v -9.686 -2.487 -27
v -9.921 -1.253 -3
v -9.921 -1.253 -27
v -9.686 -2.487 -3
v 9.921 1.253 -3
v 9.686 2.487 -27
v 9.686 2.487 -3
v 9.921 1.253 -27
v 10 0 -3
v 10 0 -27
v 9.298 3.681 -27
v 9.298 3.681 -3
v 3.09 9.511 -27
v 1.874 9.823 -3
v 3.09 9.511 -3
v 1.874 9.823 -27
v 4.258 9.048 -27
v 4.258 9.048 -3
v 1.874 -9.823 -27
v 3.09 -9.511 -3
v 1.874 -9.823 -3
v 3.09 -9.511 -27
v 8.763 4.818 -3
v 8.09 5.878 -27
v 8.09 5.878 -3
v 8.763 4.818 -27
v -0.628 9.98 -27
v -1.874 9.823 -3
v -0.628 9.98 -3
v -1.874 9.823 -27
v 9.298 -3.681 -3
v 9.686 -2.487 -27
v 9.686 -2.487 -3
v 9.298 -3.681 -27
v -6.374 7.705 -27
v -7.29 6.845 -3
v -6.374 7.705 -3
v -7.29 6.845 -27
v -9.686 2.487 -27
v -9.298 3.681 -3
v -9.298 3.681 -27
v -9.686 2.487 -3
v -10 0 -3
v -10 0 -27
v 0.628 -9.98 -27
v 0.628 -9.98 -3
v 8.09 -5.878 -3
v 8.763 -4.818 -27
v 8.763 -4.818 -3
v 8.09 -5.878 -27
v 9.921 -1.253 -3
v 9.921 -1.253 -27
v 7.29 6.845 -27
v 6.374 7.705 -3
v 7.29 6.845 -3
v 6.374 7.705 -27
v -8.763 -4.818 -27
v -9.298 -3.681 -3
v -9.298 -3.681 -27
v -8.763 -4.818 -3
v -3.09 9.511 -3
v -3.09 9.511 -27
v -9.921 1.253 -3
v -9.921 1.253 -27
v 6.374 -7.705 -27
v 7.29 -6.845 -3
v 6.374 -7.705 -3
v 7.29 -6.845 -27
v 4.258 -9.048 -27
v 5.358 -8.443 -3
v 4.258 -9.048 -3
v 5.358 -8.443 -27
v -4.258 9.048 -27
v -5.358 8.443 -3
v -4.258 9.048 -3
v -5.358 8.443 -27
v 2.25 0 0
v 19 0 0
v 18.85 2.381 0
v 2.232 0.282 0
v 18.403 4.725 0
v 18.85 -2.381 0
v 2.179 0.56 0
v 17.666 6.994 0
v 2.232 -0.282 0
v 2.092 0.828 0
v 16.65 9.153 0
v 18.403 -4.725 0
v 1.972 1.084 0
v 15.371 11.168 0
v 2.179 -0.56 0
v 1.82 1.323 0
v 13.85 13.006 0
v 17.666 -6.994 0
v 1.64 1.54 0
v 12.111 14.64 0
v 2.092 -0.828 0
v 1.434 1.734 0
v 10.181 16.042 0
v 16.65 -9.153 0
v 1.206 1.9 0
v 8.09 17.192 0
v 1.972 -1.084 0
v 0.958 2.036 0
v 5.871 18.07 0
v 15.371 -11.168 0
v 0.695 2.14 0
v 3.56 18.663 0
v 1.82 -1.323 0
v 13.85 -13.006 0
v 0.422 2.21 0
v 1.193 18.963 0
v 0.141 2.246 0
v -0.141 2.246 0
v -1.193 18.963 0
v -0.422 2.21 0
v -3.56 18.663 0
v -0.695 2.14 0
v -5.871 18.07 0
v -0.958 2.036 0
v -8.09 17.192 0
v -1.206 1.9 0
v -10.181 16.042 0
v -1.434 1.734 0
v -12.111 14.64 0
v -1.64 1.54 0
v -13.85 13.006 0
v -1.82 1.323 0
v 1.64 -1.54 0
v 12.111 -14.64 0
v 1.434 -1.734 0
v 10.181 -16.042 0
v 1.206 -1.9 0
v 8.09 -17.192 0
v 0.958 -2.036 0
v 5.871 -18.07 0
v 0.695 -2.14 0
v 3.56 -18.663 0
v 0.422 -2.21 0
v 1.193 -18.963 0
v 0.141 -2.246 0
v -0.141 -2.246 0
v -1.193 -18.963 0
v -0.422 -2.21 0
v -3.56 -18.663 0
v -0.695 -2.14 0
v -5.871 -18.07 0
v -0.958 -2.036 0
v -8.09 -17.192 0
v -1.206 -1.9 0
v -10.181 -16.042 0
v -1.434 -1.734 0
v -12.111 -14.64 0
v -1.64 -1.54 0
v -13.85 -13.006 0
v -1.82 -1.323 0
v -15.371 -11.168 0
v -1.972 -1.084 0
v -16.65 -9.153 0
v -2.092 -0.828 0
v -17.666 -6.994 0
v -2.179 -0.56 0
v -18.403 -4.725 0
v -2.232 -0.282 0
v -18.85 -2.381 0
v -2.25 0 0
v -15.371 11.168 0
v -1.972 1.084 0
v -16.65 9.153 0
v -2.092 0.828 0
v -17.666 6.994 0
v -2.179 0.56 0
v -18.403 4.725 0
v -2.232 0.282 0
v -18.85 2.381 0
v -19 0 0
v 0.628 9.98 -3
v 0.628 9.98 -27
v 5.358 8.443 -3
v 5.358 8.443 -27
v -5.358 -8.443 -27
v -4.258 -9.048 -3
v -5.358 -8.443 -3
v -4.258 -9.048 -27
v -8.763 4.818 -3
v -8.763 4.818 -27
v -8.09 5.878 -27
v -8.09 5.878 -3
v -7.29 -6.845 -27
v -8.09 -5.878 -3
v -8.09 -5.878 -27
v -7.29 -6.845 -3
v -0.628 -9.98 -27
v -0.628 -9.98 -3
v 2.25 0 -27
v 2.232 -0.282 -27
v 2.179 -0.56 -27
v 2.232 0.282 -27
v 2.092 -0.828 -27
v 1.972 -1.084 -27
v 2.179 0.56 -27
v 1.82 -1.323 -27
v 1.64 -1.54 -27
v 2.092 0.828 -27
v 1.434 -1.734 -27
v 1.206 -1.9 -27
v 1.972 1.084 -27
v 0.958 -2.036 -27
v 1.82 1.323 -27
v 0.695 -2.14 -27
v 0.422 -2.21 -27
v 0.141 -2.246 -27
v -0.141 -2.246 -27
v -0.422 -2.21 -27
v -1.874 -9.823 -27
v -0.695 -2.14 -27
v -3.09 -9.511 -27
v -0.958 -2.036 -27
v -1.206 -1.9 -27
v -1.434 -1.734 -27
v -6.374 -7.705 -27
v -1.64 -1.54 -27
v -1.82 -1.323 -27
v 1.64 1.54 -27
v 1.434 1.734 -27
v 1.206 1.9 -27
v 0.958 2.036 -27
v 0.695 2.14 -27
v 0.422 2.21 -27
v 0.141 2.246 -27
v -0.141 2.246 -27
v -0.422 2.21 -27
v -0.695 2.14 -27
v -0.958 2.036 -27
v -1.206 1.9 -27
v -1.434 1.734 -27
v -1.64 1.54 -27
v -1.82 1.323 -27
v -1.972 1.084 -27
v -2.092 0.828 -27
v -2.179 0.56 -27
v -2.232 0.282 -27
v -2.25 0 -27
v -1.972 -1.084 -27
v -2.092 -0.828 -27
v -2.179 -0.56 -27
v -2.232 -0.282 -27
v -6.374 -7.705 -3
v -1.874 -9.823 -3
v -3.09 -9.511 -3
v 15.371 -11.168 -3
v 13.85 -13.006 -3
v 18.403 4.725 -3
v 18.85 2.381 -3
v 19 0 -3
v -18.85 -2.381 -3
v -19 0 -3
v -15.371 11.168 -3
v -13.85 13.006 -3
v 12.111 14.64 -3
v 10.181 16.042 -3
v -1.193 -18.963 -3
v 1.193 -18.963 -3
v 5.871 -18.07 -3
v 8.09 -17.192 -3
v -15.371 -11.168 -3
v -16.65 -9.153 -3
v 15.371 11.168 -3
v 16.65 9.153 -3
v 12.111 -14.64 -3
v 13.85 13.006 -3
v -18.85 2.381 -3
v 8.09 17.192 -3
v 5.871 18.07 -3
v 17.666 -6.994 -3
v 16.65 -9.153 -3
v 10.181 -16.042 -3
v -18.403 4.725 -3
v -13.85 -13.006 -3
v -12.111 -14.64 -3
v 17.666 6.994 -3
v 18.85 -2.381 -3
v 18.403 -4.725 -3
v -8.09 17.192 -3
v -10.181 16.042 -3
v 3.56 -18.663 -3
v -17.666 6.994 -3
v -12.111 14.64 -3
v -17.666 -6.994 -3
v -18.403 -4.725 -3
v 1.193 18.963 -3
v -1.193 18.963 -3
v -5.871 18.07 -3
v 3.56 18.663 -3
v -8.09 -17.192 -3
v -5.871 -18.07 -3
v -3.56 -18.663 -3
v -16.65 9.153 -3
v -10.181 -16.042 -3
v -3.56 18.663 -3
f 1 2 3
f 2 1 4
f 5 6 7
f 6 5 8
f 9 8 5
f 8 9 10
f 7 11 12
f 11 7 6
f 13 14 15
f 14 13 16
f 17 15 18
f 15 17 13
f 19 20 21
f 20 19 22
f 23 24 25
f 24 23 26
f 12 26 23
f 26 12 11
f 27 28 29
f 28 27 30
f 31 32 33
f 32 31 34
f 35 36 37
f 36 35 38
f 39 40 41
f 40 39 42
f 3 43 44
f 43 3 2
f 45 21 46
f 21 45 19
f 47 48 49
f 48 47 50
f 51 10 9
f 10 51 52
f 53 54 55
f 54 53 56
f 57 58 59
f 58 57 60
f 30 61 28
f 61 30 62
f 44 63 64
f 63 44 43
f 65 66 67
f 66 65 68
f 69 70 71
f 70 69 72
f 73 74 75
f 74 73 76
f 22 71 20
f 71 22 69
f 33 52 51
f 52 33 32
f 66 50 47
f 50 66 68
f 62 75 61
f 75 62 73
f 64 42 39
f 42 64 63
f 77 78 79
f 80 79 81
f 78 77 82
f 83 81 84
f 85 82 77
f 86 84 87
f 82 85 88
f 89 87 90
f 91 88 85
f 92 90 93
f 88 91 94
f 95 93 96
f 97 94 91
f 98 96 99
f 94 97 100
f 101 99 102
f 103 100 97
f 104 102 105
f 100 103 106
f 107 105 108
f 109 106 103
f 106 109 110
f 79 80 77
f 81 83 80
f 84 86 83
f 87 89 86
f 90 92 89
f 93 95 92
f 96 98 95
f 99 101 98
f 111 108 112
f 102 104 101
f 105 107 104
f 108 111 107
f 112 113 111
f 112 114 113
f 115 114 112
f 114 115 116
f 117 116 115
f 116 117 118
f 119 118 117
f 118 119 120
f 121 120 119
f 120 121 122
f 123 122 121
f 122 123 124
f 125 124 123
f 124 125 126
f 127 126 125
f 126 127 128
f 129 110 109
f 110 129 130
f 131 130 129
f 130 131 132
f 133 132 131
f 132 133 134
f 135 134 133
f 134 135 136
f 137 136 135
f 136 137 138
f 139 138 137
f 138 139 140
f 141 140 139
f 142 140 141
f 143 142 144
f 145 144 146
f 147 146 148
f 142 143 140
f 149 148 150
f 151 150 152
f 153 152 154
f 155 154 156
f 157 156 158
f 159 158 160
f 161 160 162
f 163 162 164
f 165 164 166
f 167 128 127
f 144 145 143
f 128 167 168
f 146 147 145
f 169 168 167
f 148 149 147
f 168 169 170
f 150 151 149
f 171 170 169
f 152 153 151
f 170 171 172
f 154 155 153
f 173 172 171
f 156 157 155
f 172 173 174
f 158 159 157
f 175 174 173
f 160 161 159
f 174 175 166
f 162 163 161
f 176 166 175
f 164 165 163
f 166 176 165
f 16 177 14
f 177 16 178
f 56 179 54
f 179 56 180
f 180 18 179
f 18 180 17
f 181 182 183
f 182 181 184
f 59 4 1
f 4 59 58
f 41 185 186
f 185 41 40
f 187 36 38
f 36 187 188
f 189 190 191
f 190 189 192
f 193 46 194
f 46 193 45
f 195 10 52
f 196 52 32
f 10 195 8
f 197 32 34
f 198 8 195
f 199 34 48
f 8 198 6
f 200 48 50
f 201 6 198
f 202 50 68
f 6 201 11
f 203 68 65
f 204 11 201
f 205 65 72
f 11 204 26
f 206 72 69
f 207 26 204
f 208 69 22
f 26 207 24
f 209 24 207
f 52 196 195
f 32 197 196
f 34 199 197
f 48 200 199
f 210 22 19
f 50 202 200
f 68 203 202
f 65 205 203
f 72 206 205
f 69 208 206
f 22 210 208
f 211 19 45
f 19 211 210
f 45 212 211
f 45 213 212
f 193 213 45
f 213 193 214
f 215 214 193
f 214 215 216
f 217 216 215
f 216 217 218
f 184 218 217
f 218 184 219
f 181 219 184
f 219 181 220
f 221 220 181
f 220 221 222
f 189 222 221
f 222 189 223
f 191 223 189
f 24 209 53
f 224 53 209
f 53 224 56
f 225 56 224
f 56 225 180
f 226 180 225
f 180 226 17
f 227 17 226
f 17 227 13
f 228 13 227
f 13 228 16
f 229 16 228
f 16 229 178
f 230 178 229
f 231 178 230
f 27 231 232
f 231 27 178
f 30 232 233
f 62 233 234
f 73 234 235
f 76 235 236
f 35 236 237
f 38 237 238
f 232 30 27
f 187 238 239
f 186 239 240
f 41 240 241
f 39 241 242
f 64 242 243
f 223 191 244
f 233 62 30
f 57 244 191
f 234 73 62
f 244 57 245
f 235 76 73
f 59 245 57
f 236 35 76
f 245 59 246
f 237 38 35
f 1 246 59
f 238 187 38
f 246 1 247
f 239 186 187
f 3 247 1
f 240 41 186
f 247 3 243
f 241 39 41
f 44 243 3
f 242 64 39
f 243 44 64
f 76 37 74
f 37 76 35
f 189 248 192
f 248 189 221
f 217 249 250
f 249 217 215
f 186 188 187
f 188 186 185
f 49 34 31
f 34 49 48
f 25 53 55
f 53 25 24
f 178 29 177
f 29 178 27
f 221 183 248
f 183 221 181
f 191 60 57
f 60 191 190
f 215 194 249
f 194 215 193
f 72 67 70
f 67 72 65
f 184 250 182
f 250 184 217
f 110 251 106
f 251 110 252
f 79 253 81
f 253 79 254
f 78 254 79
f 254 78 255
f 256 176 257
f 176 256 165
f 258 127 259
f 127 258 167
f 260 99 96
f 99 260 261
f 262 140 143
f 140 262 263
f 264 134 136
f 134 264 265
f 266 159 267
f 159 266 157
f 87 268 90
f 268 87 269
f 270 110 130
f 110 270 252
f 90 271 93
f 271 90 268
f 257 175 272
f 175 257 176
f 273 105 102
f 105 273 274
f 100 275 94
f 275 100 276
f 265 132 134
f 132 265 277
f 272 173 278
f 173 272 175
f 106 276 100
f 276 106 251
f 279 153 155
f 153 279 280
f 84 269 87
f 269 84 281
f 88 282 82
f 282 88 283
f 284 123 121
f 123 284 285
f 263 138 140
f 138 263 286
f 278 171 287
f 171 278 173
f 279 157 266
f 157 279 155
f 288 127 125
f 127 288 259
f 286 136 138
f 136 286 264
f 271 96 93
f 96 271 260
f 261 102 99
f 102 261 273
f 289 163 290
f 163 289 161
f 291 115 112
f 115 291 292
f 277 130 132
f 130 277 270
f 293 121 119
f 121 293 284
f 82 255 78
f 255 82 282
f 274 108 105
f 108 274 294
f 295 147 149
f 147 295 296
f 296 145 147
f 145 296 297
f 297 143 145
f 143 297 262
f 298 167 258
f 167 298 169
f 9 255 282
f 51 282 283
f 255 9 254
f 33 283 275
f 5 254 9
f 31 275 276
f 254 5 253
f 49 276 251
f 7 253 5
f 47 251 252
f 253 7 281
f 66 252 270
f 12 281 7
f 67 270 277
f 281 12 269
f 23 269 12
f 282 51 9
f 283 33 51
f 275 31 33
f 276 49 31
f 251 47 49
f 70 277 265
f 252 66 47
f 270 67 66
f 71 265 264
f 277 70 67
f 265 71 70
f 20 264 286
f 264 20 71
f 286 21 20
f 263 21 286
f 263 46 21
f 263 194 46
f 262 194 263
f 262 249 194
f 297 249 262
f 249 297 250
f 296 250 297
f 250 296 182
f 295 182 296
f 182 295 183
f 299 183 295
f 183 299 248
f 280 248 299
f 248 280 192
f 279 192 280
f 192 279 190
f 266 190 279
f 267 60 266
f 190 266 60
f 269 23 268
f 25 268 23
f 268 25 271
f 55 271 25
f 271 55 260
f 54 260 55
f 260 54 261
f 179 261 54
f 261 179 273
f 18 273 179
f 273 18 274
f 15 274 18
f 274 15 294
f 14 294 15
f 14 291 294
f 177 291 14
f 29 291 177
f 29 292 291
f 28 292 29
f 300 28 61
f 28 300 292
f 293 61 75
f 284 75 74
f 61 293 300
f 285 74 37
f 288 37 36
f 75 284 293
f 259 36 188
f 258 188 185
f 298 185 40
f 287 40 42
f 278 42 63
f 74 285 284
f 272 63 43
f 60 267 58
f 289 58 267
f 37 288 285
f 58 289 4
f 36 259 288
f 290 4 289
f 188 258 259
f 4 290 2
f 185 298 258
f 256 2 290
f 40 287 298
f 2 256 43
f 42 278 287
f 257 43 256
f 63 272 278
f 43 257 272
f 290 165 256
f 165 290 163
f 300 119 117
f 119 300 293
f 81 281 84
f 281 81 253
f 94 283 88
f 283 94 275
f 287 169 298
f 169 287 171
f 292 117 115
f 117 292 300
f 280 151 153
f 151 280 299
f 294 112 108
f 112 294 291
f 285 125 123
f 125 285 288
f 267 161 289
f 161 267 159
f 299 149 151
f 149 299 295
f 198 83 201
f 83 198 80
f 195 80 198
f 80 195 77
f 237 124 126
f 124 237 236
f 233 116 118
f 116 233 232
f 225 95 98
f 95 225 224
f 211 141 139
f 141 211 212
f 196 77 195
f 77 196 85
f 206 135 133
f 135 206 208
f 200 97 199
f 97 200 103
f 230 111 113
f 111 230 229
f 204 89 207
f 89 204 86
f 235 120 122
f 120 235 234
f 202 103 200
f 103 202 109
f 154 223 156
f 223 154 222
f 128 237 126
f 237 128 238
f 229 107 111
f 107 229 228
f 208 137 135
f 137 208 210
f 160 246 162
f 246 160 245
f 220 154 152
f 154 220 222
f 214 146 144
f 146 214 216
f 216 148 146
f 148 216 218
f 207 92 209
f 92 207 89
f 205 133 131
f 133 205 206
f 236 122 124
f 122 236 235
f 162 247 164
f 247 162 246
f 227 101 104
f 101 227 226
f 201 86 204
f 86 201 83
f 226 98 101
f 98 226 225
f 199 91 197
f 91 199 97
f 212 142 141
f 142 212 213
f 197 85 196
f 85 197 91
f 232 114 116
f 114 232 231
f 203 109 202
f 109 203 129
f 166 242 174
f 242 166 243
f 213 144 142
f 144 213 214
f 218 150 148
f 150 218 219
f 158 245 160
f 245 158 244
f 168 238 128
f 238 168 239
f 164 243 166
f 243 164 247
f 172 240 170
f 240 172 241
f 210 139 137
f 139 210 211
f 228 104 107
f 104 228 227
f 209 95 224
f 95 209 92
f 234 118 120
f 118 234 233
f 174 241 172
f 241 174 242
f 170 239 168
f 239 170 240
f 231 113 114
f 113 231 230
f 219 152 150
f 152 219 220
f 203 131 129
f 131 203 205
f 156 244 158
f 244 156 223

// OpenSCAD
$fn = 50;


difference() {
	union() {
		translate(v = [0, 0, -27.0000000000]) {
			cylinder(h = 27, r = 10.0000000000);
		}
		translate(v = [0, 0, -3.0000000000]) {
			cylinder(h = 3, r = 19.0000000000);
		}
	}
	union() {
		#translate(v = [0, 0, -27]) {
			cylinder(h = 27, r = 2.2500000000);
		}
	}
}
